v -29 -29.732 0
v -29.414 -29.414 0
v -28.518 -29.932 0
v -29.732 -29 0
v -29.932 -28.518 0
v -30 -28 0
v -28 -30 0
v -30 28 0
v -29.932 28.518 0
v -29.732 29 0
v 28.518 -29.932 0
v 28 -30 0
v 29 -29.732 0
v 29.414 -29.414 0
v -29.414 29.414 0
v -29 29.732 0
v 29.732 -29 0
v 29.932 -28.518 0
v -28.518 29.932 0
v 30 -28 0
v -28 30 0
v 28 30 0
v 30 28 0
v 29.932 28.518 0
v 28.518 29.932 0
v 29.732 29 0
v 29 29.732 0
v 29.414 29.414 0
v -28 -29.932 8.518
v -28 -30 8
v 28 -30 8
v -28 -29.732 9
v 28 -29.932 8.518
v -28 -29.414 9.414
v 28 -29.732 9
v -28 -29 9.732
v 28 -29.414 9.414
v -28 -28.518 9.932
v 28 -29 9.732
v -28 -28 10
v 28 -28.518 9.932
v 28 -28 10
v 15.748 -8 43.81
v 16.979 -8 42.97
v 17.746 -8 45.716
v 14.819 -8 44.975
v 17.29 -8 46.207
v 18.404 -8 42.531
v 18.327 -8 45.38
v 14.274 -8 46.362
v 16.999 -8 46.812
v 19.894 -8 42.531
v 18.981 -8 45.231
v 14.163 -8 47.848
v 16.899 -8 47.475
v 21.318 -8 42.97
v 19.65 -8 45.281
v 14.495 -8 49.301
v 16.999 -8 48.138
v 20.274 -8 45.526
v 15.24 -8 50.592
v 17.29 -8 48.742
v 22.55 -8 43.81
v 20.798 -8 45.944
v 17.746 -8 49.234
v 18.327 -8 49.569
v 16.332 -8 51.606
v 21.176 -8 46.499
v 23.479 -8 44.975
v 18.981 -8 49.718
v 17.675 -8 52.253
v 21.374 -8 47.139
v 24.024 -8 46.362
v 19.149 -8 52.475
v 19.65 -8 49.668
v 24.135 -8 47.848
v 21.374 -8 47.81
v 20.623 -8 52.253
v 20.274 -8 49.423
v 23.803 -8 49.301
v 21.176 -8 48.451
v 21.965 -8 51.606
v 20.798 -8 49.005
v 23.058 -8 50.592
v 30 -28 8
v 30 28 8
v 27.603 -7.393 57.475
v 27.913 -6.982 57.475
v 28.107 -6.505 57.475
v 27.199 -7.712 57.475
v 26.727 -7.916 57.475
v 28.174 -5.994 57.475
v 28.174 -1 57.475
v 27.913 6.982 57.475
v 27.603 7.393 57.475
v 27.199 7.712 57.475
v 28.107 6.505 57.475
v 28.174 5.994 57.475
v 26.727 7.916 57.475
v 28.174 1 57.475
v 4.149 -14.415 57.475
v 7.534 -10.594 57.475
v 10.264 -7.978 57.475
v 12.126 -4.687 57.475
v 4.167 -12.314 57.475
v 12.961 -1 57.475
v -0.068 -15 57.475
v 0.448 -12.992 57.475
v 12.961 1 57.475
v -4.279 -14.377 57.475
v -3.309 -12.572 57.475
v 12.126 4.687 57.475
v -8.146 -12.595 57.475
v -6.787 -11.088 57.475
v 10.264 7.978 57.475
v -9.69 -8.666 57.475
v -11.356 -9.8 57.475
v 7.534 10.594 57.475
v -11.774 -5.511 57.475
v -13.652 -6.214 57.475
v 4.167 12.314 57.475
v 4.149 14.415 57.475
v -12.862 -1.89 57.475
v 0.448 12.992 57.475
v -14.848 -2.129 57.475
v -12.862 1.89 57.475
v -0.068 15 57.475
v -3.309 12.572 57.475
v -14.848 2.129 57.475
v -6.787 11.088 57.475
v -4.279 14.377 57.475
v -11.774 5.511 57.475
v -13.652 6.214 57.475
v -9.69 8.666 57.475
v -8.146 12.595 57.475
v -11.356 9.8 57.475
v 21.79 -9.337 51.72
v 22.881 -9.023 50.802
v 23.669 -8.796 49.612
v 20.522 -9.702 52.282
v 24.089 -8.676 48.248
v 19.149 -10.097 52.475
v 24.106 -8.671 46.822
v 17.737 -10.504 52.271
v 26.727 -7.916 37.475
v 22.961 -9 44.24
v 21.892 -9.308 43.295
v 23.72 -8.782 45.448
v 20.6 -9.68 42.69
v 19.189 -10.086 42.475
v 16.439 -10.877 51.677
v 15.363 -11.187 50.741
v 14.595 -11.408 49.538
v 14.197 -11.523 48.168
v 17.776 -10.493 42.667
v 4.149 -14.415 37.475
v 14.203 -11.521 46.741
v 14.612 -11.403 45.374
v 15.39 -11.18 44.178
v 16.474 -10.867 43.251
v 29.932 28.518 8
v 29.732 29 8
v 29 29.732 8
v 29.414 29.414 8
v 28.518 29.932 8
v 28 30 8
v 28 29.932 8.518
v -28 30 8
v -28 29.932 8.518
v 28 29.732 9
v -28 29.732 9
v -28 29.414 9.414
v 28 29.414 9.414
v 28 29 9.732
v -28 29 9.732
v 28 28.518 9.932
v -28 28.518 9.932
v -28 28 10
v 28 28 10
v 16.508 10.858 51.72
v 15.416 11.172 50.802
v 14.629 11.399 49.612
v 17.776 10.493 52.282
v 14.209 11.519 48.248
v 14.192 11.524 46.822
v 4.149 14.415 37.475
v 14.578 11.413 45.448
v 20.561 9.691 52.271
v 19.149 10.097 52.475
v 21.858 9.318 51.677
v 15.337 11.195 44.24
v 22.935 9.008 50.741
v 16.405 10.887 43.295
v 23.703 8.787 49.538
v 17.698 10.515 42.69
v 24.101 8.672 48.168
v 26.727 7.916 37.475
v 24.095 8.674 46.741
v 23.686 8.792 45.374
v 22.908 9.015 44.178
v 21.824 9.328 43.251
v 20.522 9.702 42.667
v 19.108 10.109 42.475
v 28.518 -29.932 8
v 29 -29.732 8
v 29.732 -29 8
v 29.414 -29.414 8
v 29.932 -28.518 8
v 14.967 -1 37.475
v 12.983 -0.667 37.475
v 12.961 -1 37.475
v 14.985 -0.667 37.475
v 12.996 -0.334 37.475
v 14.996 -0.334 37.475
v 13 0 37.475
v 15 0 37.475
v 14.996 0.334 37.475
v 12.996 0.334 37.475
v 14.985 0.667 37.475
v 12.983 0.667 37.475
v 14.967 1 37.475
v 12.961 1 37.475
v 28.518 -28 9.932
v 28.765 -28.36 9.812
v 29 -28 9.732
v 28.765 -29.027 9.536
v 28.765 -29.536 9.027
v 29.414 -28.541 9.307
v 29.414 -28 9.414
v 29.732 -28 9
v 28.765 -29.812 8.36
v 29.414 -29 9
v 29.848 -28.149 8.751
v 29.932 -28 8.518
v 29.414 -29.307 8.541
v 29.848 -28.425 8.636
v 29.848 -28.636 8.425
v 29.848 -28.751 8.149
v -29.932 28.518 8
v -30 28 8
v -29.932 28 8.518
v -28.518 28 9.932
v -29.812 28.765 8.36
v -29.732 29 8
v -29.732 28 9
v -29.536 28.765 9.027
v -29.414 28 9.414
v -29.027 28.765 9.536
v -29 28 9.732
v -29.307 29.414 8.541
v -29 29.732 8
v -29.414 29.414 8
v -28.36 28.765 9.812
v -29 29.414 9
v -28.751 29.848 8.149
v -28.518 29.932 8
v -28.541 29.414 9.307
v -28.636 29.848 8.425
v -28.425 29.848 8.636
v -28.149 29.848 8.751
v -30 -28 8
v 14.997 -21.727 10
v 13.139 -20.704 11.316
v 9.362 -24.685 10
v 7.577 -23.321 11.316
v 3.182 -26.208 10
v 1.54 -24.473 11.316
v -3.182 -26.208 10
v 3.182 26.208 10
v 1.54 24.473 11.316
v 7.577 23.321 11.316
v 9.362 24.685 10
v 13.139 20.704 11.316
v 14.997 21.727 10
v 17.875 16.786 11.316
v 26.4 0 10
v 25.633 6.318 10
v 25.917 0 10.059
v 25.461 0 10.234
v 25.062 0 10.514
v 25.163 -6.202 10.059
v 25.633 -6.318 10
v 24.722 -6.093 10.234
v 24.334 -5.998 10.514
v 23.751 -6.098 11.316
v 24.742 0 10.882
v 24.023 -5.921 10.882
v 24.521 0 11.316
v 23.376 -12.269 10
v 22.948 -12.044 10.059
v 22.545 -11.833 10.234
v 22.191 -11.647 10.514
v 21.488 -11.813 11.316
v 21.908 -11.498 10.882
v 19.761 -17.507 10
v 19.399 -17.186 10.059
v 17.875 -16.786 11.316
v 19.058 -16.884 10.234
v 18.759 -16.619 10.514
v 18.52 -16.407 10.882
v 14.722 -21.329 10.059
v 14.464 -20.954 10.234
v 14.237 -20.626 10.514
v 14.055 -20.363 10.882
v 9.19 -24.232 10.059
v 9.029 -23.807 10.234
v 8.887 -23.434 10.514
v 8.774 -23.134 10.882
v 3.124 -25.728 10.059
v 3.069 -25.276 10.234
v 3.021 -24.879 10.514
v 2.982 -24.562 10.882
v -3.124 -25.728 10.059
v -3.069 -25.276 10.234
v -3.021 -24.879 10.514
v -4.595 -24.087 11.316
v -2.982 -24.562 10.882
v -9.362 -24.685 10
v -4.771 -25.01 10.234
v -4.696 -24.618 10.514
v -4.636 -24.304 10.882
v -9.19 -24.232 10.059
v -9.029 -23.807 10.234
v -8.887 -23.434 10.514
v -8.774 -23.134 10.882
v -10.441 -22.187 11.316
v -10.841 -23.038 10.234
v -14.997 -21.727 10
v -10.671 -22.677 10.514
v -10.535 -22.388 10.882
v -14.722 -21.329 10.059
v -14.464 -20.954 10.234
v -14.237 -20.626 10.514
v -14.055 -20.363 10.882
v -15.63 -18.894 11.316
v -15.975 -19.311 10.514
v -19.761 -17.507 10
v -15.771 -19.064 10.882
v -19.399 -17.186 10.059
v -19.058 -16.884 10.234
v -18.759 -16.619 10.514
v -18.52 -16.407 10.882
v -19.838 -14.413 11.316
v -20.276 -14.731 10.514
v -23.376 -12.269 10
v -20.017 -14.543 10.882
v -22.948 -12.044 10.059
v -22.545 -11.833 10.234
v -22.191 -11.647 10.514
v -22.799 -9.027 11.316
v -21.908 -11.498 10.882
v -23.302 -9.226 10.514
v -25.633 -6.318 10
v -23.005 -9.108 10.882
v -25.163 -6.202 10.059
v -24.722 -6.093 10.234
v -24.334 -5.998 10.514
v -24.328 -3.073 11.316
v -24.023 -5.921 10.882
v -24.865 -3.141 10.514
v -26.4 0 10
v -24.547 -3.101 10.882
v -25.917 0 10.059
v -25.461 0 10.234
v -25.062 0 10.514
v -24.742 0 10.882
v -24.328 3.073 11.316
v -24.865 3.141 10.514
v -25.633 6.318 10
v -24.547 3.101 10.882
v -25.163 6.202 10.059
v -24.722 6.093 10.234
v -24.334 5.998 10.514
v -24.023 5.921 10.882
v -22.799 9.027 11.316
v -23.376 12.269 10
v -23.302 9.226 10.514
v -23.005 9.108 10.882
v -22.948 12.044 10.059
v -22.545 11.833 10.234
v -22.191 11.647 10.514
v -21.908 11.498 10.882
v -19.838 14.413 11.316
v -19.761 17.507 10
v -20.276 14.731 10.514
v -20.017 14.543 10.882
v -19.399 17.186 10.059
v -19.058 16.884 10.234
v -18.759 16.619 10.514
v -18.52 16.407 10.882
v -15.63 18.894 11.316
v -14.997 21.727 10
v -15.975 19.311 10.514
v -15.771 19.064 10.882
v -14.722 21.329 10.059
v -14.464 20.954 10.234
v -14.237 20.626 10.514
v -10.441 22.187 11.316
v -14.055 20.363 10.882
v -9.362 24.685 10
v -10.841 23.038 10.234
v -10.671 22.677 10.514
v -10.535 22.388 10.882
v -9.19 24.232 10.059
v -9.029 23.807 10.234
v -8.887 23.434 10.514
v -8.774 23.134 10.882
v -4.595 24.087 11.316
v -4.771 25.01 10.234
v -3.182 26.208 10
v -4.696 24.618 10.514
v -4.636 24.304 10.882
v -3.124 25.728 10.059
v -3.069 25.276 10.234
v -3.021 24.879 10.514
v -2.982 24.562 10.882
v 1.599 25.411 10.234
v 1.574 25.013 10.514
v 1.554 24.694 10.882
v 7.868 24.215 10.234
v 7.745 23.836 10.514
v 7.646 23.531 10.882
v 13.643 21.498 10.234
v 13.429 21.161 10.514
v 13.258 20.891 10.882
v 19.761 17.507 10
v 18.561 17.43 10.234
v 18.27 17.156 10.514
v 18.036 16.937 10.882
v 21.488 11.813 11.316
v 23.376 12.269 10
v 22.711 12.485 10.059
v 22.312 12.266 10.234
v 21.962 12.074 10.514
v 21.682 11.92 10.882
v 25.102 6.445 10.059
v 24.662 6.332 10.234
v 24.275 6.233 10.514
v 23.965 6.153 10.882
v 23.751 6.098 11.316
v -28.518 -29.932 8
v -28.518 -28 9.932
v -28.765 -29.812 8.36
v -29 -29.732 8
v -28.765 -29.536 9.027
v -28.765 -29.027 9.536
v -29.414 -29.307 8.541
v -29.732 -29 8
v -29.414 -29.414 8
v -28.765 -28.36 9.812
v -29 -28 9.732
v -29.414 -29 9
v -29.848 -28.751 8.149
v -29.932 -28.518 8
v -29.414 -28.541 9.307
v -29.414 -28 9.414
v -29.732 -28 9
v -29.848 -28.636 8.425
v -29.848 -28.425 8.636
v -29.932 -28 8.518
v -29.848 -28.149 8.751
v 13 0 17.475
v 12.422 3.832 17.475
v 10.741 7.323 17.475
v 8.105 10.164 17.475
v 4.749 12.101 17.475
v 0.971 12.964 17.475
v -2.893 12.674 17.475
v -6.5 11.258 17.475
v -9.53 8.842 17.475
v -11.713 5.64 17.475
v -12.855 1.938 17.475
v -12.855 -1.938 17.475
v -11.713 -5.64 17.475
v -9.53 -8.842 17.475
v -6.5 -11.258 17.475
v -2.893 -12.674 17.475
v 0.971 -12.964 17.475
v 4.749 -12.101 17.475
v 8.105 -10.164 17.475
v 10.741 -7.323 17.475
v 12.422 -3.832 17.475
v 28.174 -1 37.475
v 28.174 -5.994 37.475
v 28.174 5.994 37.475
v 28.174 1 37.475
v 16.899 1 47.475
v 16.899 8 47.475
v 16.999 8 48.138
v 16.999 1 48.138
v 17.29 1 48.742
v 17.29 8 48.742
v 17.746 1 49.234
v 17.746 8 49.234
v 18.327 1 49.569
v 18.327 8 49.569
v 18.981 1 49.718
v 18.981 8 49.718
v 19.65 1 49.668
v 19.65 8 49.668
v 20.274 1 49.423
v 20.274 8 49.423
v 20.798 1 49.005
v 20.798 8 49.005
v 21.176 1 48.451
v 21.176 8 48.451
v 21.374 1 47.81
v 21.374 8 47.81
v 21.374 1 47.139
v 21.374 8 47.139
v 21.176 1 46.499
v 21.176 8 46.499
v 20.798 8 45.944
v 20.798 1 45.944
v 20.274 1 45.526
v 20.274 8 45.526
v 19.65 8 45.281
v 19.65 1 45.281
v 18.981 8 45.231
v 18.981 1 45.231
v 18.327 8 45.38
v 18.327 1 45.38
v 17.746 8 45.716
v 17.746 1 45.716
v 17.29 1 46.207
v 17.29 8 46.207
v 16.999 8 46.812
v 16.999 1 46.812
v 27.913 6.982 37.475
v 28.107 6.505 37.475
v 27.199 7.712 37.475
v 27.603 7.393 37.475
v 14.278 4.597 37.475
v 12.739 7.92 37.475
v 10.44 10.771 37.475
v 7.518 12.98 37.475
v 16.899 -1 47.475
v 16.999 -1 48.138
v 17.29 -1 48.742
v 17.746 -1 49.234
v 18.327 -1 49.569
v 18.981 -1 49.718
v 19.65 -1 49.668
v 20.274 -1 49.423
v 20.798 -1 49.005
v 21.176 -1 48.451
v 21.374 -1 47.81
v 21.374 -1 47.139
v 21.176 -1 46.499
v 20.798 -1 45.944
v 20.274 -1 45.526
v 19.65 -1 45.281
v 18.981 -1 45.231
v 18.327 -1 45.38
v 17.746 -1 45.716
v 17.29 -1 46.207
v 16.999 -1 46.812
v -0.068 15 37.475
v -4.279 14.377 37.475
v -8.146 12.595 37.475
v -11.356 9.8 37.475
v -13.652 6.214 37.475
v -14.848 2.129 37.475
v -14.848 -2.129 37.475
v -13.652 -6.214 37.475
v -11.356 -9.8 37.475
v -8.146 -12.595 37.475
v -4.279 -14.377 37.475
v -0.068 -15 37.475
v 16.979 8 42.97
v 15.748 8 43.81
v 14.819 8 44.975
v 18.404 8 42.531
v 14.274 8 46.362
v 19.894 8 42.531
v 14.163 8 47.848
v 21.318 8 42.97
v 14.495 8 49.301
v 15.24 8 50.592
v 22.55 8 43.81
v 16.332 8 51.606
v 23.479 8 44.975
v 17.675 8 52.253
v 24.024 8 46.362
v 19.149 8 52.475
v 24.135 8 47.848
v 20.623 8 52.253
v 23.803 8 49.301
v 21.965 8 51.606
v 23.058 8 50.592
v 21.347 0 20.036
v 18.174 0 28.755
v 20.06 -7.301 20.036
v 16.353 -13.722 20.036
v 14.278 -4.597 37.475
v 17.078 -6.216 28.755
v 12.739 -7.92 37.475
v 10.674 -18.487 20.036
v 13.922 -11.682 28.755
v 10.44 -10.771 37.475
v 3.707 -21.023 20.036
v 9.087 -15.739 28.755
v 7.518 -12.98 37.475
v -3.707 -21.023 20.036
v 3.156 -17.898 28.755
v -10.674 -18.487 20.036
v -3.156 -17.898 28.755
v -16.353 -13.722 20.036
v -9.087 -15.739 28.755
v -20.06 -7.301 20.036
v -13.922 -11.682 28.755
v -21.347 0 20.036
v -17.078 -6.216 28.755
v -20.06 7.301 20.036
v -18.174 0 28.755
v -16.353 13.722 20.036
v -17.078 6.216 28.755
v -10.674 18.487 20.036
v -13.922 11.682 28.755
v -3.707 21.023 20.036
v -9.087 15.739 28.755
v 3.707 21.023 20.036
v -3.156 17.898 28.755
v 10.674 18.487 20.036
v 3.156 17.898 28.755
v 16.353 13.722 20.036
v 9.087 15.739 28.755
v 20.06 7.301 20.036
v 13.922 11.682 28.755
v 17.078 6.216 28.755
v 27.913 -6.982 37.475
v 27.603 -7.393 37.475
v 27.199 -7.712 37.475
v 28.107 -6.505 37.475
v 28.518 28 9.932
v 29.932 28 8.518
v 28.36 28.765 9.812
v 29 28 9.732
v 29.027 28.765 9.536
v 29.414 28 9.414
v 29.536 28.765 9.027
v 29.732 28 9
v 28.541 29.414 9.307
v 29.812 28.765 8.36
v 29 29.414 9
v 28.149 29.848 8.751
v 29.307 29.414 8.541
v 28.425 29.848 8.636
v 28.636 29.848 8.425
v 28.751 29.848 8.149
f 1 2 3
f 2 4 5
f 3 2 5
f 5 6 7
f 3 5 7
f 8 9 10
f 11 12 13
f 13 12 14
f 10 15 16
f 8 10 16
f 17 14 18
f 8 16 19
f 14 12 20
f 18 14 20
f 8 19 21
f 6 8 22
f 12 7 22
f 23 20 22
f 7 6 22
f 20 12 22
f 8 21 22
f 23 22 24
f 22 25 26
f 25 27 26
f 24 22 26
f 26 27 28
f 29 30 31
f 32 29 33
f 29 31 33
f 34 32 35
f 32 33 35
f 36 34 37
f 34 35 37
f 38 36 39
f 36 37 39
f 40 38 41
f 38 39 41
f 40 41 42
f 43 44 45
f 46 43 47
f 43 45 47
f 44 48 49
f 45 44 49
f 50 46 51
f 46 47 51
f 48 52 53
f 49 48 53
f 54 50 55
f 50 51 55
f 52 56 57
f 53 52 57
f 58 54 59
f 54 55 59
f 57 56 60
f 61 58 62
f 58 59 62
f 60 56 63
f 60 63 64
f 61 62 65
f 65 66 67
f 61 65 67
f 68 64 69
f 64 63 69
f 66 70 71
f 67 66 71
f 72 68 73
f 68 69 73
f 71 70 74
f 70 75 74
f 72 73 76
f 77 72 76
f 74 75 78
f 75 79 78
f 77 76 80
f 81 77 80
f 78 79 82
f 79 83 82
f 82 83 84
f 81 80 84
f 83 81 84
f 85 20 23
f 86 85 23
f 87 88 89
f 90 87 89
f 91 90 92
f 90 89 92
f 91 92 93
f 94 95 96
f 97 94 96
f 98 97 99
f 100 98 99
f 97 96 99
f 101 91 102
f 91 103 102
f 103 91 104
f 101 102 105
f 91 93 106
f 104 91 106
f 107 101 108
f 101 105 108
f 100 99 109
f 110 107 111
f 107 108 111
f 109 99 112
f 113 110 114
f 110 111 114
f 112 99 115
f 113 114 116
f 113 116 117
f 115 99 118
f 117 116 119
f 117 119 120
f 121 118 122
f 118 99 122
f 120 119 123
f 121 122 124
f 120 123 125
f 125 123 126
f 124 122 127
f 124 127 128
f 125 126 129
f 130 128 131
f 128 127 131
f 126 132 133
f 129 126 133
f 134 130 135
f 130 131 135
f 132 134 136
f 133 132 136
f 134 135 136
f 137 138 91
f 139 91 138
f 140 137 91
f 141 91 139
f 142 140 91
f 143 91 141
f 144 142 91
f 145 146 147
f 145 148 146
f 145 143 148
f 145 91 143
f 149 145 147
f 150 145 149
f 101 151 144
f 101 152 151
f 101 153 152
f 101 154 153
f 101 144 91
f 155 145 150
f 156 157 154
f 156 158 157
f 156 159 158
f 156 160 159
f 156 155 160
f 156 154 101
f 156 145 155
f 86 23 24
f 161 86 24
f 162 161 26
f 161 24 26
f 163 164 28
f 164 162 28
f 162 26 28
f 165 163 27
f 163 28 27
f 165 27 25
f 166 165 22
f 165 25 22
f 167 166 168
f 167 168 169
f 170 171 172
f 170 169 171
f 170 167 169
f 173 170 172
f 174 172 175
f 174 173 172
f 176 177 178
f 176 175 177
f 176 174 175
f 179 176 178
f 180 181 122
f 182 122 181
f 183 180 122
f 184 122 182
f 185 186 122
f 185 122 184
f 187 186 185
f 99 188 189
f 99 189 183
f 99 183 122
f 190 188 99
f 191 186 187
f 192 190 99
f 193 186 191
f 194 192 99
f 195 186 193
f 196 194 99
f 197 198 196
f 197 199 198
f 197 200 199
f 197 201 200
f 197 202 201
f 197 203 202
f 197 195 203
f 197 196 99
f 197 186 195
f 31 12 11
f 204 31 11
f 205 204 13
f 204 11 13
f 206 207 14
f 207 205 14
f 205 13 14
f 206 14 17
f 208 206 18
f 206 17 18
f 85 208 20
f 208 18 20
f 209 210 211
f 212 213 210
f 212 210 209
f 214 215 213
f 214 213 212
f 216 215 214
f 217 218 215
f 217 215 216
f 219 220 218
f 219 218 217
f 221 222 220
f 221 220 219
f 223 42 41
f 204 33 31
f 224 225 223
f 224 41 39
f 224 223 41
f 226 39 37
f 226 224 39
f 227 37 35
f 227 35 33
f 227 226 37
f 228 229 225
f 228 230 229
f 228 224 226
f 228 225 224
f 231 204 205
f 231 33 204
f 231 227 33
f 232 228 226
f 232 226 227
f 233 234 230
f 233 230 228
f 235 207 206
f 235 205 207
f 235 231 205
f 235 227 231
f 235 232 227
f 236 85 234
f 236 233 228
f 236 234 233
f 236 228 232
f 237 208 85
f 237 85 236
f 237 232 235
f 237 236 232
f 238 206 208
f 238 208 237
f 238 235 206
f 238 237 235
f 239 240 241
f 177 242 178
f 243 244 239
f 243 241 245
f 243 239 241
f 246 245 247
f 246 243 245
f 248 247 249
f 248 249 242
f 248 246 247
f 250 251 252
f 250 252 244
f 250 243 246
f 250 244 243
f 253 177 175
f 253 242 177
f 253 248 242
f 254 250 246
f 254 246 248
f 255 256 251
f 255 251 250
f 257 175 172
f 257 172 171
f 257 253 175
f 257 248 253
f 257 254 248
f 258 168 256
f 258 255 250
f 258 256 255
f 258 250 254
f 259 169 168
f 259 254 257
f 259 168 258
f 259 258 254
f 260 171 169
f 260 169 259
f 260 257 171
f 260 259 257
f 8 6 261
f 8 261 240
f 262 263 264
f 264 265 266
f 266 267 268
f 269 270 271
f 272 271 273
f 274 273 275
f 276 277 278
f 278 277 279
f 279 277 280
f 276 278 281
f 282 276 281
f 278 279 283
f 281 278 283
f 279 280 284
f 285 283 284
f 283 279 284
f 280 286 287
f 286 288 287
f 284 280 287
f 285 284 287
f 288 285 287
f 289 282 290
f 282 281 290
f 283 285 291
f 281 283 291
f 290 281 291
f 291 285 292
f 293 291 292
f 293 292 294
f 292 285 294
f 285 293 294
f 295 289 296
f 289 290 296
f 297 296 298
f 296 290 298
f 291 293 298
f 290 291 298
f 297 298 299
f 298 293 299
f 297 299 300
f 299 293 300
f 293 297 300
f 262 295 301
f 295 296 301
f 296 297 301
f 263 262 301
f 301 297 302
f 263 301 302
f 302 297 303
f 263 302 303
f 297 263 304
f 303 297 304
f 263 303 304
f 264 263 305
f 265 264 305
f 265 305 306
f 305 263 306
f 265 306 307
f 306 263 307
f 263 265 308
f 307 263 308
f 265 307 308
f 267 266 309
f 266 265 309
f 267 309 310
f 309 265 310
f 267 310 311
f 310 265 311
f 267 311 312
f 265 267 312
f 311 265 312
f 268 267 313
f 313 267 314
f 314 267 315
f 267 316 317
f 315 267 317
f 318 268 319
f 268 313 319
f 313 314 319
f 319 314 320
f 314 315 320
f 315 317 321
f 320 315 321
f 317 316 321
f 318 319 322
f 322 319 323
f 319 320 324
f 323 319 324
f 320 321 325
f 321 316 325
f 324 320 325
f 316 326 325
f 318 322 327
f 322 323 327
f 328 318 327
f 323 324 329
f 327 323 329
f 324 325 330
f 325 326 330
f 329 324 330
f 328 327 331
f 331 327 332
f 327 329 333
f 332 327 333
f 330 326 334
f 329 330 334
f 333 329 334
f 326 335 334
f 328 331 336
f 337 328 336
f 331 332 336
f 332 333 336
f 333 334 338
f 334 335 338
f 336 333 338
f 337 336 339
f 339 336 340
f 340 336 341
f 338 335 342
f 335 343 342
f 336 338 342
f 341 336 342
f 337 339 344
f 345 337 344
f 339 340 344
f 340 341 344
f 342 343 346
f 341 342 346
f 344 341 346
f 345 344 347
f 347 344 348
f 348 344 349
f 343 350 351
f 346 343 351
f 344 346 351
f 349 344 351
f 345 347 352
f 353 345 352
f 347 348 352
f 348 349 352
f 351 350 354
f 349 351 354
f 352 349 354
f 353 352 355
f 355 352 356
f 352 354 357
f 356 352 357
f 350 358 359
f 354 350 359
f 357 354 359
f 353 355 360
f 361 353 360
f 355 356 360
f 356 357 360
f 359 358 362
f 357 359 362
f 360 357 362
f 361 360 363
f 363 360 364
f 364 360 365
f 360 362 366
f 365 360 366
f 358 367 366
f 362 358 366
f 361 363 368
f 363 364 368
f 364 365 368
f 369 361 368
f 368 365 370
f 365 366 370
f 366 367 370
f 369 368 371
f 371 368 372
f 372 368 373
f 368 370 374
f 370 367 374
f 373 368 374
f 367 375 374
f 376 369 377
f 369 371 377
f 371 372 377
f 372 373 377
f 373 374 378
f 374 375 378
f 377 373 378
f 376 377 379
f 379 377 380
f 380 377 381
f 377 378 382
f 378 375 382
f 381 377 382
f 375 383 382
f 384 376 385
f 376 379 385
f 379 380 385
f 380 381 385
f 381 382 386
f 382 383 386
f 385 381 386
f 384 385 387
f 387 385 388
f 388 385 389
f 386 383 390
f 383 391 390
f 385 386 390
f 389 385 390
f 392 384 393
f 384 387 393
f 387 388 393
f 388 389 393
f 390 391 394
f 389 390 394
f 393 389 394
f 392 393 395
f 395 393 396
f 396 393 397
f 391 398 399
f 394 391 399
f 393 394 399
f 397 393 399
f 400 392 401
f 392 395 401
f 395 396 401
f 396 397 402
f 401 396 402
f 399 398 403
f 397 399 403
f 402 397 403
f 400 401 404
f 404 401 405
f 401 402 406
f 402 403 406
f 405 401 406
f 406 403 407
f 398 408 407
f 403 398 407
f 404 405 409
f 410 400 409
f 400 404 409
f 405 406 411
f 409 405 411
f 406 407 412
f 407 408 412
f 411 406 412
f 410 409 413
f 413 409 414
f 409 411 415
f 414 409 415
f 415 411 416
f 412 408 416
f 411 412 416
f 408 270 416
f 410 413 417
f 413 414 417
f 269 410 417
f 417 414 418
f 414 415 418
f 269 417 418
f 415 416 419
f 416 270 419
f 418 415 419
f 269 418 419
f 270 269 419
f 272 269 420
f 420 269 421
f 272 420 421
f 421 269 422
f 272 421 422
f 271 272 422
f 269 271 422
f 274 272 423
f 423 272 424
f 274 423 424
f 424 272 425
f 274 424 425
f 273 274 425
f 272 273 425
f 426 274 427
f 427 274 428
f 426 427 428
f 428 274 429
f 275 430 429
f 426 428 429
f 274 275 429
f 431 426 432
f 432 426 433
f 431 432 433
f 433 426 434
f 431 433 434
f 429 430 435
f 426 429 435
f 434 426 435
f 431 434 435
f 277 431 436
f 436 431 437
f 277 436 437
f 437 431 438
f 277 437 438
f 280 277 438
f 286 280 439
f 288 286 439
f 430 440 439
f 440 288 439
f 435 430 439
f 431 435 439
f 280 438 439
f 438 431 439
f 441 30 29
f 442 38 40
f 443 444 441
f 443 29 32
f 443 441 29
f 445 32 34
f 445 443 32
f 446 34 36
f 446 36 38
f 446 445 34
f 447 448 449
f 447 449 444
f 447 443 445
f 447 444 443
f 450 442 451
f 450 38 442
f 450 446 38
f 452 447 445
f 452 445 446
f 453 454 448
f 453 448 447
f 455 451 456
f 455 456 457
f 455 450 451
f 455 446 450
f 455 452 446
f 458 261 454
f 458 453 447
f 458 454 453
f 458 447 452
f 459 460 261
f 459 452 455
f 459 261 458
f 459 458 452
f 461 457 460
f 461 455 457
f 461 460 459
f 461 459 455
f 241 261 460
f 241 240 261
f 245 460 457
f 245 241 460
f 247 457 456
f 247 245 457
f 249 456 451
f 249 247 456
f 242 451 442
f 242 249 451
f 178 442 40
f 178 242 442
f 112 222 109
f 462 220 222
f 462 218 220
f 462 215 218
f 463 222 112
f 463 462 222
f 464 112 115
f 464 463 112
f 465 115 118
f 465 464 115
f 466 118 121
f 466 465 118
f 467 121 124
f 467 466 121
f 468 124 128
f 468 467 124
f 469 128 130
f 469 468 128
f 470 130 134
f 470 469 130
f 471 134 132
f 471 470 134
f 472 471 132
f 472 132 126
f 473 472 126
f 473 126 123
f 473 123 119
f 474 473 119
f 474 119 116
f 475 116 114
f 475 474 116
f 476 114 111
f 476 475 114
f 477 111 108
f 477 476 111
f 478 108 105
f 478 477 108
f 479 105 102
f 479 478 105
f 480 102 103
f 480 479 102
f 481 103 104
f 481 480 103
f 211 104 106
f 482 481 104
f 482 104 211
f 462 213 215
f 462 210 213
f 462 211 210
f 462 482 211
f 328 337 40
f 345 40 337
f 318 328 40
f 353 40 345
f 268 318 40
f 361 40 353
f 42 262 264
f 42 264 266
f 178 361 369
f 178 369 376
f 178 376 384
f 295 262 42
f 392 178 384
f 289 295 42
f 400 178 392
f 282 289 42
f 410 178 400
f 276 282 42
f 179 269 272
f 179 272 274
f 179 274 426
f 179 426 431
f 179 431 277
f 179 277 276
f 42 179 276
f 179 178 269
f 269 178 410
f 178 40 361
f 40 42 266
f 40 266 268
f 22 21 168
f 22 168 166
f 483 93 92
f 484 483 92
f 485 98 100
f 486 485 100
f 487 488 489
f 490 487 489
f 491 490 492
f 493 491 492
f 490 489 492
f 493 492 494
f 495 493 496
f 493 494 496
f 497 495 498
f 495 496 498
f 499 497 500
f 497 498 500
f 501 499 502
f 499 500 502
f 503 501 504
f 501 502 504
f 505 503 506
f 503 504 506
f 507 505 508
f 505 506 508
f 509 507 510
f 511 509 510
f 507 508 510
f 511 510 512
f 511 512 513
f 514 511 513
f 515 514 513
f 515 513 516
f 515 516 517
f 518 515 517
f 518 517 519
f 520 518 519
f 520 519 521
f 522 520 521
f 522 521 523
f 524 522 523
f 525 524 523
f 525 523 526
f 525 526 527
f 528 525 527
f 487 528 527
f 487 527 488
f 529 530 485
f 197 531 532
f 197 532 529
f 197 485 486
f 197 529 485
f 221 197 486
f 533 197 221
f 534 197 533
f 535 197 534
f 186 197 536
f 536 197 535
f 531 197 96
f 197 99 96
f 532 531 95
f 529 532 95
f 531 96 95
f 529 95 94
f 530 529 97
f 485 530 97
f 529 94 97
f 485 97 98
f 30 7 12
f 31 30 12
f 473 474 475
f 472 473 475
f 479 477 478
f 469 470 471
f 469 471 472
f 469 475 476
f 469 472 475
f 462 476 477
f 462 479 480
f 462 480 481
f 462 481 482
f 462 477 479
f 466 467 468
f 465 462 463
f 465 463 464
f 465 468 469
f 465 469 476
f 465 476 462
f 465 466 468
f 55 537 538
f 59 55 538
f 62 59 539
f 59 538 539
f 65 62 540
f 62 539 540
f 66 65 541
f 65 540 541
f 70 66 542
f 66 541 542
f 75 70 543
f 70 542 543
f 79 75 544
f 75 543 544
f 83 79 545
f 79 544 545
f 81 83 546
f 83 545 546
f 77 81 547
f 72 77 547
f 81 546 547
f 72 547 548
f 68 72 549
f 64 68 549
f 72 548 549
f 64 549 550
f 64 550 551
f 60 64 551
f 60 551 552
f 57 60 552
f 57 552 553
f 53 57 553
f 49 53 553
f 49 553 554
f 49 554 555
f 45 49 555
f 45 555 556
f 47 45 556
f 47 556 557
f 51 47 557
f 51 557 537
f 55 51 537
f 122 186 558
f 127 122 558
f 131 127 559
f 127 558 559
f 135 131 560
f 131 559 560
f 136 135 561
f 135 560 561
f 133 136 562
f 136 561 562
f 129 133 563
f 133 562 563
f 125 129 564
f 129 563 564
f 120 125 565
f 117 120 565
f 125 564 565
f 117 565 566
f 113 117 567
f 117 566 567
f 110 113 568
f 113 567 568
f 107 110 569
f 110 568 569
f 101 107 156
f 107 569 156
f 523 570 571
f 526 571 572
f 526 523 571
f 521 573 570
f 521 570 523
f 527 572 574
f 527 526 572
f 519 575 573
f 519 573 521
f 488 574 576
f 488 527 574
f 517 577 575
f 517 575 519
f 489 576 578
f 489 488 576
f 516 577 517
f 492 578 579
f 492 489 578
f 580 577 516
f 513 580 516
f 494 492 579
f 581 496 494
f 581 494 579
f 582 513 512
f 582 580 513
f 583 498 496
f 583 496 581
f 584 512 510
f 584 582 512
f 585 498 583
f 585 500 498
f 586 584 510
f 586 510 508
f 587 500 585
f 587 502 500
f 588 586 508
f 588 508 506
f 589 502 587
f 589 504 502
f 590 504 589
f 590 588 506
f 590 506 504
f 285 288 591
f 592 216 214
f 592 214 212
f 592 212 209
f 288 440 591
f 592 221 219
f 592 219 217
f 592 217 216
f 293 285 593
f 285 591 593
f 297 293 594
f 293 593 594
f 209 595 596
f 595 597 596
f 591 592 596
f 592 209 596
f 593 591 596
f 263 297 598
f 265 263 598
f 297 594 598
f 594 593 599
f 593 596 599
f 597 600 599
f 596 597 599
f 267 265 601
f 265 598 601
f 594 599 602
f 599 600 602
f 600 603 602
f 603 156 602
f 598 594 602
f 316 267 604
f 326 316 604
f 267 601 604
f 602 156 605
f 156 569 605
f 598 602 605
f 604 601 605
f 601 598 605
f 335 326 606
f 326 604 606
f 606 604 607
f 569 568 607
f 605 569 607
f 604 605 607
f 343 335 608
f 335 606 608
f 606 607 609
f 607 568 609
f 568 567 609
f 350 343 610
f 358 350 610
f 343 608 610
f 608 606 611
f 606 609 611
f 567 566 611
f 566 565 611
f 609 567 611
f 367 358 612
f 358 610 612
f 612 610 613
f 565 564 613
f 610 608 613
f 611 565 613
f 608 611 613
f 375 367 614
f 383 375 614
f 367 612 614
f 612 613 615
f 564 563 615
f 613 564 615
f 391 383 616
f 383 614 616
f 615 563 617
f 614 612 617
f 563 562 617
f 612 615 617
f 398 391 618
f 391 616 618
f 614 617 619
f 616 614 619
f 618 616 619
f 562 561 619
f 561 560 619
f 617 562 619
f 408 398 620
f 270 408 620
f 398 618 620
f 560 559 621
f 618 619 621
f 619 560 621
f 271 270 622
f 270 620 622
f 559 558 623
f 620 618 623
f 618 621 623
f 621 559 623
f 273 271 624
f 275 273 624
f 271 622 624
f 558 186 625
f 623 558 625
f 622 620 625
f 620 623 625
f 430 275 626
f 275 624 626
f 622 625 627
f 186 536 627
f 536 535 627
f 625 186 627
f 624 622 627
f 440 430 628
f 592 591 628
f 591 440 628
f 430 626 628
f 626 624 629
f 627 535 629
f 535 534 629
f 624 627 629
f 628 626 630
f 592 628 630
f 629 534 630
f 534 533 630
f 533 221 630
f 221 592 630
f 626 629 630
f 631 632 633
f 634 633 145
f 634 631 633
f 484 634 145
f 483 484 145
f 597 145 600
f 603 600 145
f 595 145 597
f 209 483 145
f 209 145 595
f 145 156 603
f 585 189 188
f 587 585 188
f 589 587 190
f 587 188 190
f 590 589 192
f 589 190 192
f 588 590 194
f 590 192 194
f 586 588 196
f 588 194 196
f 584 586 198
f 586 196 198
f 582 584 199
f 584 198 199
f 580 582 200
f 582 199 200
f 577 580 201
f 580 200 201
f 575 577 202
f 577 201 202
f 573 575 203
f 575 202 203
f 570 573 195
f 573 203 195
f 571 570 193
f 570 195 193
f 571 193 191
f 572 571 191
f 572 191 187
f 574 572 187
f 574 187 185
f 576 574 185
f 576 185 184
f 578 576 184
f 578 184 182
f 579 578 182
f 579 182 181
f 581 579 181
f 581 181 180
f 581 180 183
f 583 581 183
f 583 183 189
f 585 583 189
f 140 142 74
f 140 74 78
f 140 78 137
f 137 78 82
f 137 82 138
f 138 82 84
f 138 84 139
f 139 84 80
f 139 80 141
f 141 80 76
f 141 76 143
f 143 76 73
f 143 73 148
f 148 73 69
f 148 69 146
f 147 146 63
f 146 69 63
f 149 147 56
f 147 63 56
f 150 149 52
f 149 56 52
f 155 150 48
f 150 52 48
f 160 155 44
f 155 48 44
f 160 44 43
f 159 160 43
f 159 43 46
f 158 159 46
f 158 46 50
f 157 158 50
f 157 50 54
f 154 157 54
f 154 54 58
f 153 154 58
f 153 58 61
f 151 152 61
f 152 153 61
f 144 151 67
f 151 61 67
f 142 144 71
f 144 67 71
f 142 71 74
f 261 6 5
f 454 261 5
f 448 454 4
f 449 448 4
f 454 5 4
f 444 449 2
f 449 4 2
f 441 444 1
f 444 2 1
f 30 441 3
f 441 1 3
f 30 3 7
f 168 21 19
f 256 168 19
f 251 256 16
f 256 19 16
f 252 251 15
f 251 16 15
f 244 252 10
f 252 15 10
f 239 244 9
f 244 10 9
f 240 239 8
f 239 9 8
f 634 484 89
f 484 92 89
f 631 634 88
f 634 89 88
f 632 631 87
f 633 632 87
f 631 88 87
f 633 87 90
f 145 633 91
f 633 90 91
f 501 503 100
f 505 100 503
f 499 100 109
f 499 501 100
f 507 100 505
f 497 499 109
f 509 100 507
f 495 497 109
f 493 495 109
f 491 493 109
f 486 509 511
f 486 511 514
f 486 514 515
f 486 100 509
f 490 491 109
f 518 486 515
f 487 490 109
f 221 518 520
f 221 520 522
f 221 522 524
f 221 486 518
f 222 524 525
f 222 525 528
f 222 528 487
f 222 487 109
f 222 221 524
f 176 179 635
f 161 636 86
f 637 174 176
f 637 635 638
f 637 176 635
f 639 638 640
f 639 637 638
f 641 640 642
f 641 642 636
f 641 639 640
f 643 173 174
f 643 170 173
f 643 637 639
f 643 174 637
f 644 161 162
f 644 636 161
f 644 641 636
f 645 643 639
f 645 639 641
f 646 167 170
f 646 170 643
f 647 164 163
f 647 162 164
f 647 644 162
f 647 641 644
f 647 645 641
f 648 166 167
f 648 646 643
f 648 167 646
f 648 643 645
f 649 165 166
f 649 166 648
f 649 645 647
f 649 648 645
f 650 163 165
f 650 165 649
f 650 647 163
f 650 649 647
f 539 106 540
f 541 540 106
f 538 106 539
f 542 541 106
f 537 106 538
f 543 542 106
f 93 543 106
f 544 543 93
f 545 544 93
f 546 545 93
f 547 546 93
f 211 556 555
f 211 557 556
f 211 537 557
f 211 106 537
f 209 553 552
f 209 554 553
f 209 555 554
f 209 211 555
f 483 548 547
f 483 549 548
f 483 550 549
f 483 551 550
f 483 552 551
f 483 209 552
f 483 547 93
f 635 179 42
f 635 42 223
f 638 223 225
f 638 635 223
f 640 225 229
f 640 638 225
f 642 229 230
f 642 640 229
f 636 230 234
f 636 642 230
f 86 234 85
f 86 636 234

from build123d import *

# Parameters (mm, degrees)
SKETCH1_W           = 60
SKETCH1_H           = 60
BOSS_EXTRUDE1_DEPTH = 10
FILLET1_R           = 2
FILLET2_R           = 2
SKETCH3_R           = 15
SKETCH3_R_2         = 13
BOSS_EXTRUDE2_DEPTH = 20
CUT_EXTRUDE1_START  = -20
SKETCH4_R           = 13
CUT_EXTRUDE1_DEPTH  = 20
BOSS_EXTRUDE4_START = -20
BOSS_EXTRUDE4_DEPTH = 20
FILLET5_R           = 2
CUT_EXTRUDE2_REACH  = 83.874
SKETCH12_R          = 2.25
SKETCH13_R          = 5
CUT_EXTRUDE3_DEPTH  = 12
CUT_EXTRUDE4_START  = 12
SKETCH14_R          = 5
CUT_EXTRUDE4_DEPTH  = 12
CUT_EXTRUDE12_START = -20
CUT_EXTRUDE12_DEPTH = 20


with BuildPart() as part:
    # Sketch1 → Boss-Extrude1 (new body)
    with BuildSketch(Plane.XY):
        Rectangle(SKETCH1_W, SKETCH1_H)
    extrude(amount=BOSS_EXTRUDE1_DEPTH)

    # Sketch2 → Revolve1 (revolve)
    with BuildSketch(Plane(origin=(0, 0, 0), x_dir=(1, 0, 0), z_dir=(0, 1, 0)), mode=Mode.PRIVATE) as revolve1_sk:
        Polygon((-25, -10), (-15, -37.474774195), (0, -37.474774195), (0, -10), align=None)
    revolve(revolve1_sk.sketch.rotate(Axis((0, 0, 38.640996606), (0, 0, -1)), 180), axis=Axis((0, 0, 38.640996606), (0, 0, -1)))

    # Fillet1
    fillet1_edges = [part.edges().sort_by_distance(p)[0] for p in [
        (30, 0, 10),
        (0, 30, 10),
        (-25, 0, 10),
        (-30, 0, 10),
        (0, -30, 10),
    ]]
    fillet(fillet1_edges, radius=FILLET1_R)

    # Fillet2
    # the kernel refuses this fillet: 2 mm, written as the material it takes off along each edge
    with BuildSketch(Plane(origin=(28, -28, 8), x_dir=(0, -1, 0), z_dir=(1, 0, 0))) as fillet2_piece_1_section:
        Polygon((0, 0), (FILLET2_R, 0), (FILLET2_R, -FILLET2_R), (0, -FILLET2_R), align=None)
    fillet2_piece_1 = extrude(amount=FILLET2_R, mode=Mode.PRIVATE)
    fillet2_piece_1 = fillet2_piece_1 - Plane(origin=(28, -28, 8), x_dir=(0, 0.7071067811865475, -0.7071067811865475), z_dir=(1, 0, 0)) * Sphere(FILLET2_R, mode=Mode.PRIVATE)
    add(fillet2_piece_1, mode=Mode.SUBTRACT)
    with BuildSketch(Plane(origin=(-28, -28, 8), x_dir=(0, -1, 0), z_dir=(-1, 0, 0))) as fillet2_piece_2_section:
        Polygon((0, 0), (FILLET2_R, 0), (FILLET2_R, FILLET2_R), (0, FILLET2_R), align=None)
    fillet2_piece_2 = extrude(amount=FILLET2_R, mode=Mode.PRIVATE)
    fillet2_piece_2 = fillet2_piece_2 - Plane(origin=(-28, -28, 8), x_dir=(0, 0.7071067811865475, -0.7071067811865475), z_dir=(-1, 0, 0)) * Sphere(FILLET2_R, mode=Mode.PRIVATE)
    add(fillet2_piece_2, mode=Mode.SUBTRACT)
    with BuildSketch(Plane(origin=(28, 28, 8), x_dir=(1, 0, 0), z_dir=(0, 1, 0))) as fillet2_piece_3_section:
        Polygon((0, 0), (FILLET2_R, 0), (FILLET2_R, -FILLET2_R), (0, -FILLET2_R), align=None)
    fillet2_piece_3 = extrude(amount=FILLET2_R, mode=Mode.PRIVATE)
    fillet2_piece_3 = fillet2_piece_3 - Plane(origin=(28, 28, 8), x_dir=(-0.7071067811865475, 0, -0.7071067811865475), z_dir=(0, 1, 0)) * Sphere(FILLET2_R, mode=Mode.PRIVATE)
    add(fillet2_piece_3, mode=Mode.SUBTRACT)
    with BuildSketch(Plane(origin=(-28, 28, 8), x_dir=(-1, 0, 0), z_dir=(0, 1, 0))) as fillet2_piece_4_section:
        Polygon((0, 0), (FILLET2_R, 0), (FILLET2_R, FILLET2_R), (0, FILLET2_R), align=None)
    fillet2_piece_4 = extrude(amount=FILLET2_R, mode=Mode.PRIVATE)
    fillet2_piece_4 = fillet2_piece_4 - Plane(origin=(-28, 28, 8), x_dir=(0.7071067811865475, 0, -0.7071067811865475), z_dir=(0, 1, 0)) * Sphere(FILLET2_R, mode=Mode.PRIVATE)
    add(fillet2_piece_4, mode=Mode.SUBTRACT)
    with BuildSketch(Plane(origin=(-30, 30, -5), x_dir=(1, 0, 0), z_dir=(0, 0, 1)), Plane(origin=(-30, -30, -5), x_dir=(0, 1, 0), z_dir=(0, 0, 1))) as fillet2_piece_5:
        with BuildLine():
            CenterArc((FILLET2_R, -FILLET2_R), FILLET2_R, 90, 90)
            Line((0, -FILLET2_R), (0, 0))
            Line((0, 0), (FILLET2_R, 0))
        make_face()
    extrude(amount=13, mode=Mode.SUBTRACT)
    with BuildSketch(Plane(origin=(30, 30, -5), x_dir=(-1, 0, 0), z_dir=(0, 0, 1)), Plane(origin=(30, -30, -5), x_dir=(0, 1, 0), z_dir=(0, 0, 1))) as fillet2_piece_6:
        with BuildLine():
            CenterArc((FILLET2_R, FILLET2_R), FILLET2_R, 180, 90)
            Line((0, FILLET2_R), (0, 0))
            Line((0, 0), (FILLET2_R, 0))
        make_face()
    extrude(amount=13, mode=Mode.SUBTRACT)

    # Sketch3 → Boss-Extrude2 (add)
    with BuildSketch(Plane.XY.offset(37.474774195)):
        Circle(SKETCH3_R)
        Circle(SKETCH3_R_2, mode=Mode.SUBTRACT)
    extrude(amount=BOSS_EXTRUDE2_DEPTH)

    # Sketch4 → Cut-Extrude1 (cut)
    with BuildSketch(Plane.XY.offset(37.474774195).offset(CUT_EXTRUDE1_START)):
        Circle(SKETCH4_R)
    extrude(amount=CUT_EXTRUDE1_DEPTH, mode=Mode.SUBTRACT)

    # Sketch7 → Boss-Extrude4 (add)
    with BuildSketch(Plane.XY.offset(57.474774195).offset(BOSS_EXTRUDE4_START)):
        with BuildLine():
            Line((4.148885958, 14.41480993), (28.173569174, 7.5))
            Line((28.173569174, 7.5), (28.173569174, -7.5))
            Line((28.173569174, -7.5), (4.148885958, -14.41480993))
            ThreePointArc((4.148885958, -14.41480993), (15, 0), (4.148885958, 14.41480993))
        make_face()
    extrude(amount=BOSS_EXTRUDE4_DEPTH)

    # Fillet5
    fillet5_edges = [part.edges().sort_by_distance(p)[0] for p in [
        (28.173569174, 7.5, 47.474774195),
        (28.173569174, -7.5, 47.474774195),
    ]]
    fillet(fillet5_edges, radius=FILLET5_R)

    # Cut-Extrude2: up to this plane
    cut_extrude2_end = Plane(origin=(4.148885958, -14.41480993, 37.474774195), z_dir=(0.27659239718755785, -0.9609873286459298, 0))
    # Sketch12 → Cut-Extrude2 (cut, up to the surface)
    with BuildSketch(Plane(origin=(0, 20, 0), x_dir=(1, 0, 0), z_dir=(0, 1, 0)), mode=Mode.PRIVATE) as cut_extrude2_sk1:
        with Locations(Location((19.148885958, -47.474774195, 0), (0, 0, 180))):
            Circle(SKETCH12_R)
    cut_extrude2_tool1 = split(extrude(cut_extrude2_sk1.sketch, amount=-CUT_EXTRUDE2_REACH, mode=Mode.PRIVATE), bisect_by=cut_extrude2_end, keep=Keep.BOTH, mode=Mode.PRIVATE)
    add(cut_extrude2_tool1.solids().sort_by_distance((19.148886, 20, 47.474774))[0], mode=Mode.SUBTRACT)

    # Sketch13 → Cut-Extrude3 (cut)
    with BuildSketch(Plane(origin=(0, 20, 0), x_dir=(1, 0, 0), z_dir=(0, 1, 0))):
        with Locations(Location((19.148885958, -47.474774195, 0), (0, 0, 270))):
            Circle(SKETCH13_R)
    extrude(amount=-CUT_EXTRUDE3_DEPTH, mode=Mode.SUBTRACT)

    # Sketch14 → Cut-Extrude4 (cut)
    with BuildSketch(Plane(origin=(0, -20, 0), x_dir=(1, 0, 0), z_dir=(0, 1, 0)).offset(CUT_EXTRUDE4_START)):
        with Locations(Location((19.148885958, -47.474774195, 0), (0, 0, 270))):
            Circle(SKETCH14_R)
    extrude(amount=-CUT_EXTRUDE4_DEPTH, mode=Mode.SUBTRACT)

    # Sketch15 → Cut-Extrude12 (cut)
    with BuildSketch(Plane.XY.offset(57.474774195).offset(CUT_EXTRUDE12_START)):
        with BuildLine():
            Line((28.173569174, 1), (12.961481397, 1))
            ThreePointArc((12.961481397, 1), (13, 0), (12.961481397, -1))
            Line((12.961481397, -1), (28.173569174, -1))
            Line((28.173569174, -1), (28.173569174, 1))
        make_face()
    extrude(amount=CUT_EXTRUDE12_DEPTH, mode=Mode.SUBTRACT)


solid = part.part
